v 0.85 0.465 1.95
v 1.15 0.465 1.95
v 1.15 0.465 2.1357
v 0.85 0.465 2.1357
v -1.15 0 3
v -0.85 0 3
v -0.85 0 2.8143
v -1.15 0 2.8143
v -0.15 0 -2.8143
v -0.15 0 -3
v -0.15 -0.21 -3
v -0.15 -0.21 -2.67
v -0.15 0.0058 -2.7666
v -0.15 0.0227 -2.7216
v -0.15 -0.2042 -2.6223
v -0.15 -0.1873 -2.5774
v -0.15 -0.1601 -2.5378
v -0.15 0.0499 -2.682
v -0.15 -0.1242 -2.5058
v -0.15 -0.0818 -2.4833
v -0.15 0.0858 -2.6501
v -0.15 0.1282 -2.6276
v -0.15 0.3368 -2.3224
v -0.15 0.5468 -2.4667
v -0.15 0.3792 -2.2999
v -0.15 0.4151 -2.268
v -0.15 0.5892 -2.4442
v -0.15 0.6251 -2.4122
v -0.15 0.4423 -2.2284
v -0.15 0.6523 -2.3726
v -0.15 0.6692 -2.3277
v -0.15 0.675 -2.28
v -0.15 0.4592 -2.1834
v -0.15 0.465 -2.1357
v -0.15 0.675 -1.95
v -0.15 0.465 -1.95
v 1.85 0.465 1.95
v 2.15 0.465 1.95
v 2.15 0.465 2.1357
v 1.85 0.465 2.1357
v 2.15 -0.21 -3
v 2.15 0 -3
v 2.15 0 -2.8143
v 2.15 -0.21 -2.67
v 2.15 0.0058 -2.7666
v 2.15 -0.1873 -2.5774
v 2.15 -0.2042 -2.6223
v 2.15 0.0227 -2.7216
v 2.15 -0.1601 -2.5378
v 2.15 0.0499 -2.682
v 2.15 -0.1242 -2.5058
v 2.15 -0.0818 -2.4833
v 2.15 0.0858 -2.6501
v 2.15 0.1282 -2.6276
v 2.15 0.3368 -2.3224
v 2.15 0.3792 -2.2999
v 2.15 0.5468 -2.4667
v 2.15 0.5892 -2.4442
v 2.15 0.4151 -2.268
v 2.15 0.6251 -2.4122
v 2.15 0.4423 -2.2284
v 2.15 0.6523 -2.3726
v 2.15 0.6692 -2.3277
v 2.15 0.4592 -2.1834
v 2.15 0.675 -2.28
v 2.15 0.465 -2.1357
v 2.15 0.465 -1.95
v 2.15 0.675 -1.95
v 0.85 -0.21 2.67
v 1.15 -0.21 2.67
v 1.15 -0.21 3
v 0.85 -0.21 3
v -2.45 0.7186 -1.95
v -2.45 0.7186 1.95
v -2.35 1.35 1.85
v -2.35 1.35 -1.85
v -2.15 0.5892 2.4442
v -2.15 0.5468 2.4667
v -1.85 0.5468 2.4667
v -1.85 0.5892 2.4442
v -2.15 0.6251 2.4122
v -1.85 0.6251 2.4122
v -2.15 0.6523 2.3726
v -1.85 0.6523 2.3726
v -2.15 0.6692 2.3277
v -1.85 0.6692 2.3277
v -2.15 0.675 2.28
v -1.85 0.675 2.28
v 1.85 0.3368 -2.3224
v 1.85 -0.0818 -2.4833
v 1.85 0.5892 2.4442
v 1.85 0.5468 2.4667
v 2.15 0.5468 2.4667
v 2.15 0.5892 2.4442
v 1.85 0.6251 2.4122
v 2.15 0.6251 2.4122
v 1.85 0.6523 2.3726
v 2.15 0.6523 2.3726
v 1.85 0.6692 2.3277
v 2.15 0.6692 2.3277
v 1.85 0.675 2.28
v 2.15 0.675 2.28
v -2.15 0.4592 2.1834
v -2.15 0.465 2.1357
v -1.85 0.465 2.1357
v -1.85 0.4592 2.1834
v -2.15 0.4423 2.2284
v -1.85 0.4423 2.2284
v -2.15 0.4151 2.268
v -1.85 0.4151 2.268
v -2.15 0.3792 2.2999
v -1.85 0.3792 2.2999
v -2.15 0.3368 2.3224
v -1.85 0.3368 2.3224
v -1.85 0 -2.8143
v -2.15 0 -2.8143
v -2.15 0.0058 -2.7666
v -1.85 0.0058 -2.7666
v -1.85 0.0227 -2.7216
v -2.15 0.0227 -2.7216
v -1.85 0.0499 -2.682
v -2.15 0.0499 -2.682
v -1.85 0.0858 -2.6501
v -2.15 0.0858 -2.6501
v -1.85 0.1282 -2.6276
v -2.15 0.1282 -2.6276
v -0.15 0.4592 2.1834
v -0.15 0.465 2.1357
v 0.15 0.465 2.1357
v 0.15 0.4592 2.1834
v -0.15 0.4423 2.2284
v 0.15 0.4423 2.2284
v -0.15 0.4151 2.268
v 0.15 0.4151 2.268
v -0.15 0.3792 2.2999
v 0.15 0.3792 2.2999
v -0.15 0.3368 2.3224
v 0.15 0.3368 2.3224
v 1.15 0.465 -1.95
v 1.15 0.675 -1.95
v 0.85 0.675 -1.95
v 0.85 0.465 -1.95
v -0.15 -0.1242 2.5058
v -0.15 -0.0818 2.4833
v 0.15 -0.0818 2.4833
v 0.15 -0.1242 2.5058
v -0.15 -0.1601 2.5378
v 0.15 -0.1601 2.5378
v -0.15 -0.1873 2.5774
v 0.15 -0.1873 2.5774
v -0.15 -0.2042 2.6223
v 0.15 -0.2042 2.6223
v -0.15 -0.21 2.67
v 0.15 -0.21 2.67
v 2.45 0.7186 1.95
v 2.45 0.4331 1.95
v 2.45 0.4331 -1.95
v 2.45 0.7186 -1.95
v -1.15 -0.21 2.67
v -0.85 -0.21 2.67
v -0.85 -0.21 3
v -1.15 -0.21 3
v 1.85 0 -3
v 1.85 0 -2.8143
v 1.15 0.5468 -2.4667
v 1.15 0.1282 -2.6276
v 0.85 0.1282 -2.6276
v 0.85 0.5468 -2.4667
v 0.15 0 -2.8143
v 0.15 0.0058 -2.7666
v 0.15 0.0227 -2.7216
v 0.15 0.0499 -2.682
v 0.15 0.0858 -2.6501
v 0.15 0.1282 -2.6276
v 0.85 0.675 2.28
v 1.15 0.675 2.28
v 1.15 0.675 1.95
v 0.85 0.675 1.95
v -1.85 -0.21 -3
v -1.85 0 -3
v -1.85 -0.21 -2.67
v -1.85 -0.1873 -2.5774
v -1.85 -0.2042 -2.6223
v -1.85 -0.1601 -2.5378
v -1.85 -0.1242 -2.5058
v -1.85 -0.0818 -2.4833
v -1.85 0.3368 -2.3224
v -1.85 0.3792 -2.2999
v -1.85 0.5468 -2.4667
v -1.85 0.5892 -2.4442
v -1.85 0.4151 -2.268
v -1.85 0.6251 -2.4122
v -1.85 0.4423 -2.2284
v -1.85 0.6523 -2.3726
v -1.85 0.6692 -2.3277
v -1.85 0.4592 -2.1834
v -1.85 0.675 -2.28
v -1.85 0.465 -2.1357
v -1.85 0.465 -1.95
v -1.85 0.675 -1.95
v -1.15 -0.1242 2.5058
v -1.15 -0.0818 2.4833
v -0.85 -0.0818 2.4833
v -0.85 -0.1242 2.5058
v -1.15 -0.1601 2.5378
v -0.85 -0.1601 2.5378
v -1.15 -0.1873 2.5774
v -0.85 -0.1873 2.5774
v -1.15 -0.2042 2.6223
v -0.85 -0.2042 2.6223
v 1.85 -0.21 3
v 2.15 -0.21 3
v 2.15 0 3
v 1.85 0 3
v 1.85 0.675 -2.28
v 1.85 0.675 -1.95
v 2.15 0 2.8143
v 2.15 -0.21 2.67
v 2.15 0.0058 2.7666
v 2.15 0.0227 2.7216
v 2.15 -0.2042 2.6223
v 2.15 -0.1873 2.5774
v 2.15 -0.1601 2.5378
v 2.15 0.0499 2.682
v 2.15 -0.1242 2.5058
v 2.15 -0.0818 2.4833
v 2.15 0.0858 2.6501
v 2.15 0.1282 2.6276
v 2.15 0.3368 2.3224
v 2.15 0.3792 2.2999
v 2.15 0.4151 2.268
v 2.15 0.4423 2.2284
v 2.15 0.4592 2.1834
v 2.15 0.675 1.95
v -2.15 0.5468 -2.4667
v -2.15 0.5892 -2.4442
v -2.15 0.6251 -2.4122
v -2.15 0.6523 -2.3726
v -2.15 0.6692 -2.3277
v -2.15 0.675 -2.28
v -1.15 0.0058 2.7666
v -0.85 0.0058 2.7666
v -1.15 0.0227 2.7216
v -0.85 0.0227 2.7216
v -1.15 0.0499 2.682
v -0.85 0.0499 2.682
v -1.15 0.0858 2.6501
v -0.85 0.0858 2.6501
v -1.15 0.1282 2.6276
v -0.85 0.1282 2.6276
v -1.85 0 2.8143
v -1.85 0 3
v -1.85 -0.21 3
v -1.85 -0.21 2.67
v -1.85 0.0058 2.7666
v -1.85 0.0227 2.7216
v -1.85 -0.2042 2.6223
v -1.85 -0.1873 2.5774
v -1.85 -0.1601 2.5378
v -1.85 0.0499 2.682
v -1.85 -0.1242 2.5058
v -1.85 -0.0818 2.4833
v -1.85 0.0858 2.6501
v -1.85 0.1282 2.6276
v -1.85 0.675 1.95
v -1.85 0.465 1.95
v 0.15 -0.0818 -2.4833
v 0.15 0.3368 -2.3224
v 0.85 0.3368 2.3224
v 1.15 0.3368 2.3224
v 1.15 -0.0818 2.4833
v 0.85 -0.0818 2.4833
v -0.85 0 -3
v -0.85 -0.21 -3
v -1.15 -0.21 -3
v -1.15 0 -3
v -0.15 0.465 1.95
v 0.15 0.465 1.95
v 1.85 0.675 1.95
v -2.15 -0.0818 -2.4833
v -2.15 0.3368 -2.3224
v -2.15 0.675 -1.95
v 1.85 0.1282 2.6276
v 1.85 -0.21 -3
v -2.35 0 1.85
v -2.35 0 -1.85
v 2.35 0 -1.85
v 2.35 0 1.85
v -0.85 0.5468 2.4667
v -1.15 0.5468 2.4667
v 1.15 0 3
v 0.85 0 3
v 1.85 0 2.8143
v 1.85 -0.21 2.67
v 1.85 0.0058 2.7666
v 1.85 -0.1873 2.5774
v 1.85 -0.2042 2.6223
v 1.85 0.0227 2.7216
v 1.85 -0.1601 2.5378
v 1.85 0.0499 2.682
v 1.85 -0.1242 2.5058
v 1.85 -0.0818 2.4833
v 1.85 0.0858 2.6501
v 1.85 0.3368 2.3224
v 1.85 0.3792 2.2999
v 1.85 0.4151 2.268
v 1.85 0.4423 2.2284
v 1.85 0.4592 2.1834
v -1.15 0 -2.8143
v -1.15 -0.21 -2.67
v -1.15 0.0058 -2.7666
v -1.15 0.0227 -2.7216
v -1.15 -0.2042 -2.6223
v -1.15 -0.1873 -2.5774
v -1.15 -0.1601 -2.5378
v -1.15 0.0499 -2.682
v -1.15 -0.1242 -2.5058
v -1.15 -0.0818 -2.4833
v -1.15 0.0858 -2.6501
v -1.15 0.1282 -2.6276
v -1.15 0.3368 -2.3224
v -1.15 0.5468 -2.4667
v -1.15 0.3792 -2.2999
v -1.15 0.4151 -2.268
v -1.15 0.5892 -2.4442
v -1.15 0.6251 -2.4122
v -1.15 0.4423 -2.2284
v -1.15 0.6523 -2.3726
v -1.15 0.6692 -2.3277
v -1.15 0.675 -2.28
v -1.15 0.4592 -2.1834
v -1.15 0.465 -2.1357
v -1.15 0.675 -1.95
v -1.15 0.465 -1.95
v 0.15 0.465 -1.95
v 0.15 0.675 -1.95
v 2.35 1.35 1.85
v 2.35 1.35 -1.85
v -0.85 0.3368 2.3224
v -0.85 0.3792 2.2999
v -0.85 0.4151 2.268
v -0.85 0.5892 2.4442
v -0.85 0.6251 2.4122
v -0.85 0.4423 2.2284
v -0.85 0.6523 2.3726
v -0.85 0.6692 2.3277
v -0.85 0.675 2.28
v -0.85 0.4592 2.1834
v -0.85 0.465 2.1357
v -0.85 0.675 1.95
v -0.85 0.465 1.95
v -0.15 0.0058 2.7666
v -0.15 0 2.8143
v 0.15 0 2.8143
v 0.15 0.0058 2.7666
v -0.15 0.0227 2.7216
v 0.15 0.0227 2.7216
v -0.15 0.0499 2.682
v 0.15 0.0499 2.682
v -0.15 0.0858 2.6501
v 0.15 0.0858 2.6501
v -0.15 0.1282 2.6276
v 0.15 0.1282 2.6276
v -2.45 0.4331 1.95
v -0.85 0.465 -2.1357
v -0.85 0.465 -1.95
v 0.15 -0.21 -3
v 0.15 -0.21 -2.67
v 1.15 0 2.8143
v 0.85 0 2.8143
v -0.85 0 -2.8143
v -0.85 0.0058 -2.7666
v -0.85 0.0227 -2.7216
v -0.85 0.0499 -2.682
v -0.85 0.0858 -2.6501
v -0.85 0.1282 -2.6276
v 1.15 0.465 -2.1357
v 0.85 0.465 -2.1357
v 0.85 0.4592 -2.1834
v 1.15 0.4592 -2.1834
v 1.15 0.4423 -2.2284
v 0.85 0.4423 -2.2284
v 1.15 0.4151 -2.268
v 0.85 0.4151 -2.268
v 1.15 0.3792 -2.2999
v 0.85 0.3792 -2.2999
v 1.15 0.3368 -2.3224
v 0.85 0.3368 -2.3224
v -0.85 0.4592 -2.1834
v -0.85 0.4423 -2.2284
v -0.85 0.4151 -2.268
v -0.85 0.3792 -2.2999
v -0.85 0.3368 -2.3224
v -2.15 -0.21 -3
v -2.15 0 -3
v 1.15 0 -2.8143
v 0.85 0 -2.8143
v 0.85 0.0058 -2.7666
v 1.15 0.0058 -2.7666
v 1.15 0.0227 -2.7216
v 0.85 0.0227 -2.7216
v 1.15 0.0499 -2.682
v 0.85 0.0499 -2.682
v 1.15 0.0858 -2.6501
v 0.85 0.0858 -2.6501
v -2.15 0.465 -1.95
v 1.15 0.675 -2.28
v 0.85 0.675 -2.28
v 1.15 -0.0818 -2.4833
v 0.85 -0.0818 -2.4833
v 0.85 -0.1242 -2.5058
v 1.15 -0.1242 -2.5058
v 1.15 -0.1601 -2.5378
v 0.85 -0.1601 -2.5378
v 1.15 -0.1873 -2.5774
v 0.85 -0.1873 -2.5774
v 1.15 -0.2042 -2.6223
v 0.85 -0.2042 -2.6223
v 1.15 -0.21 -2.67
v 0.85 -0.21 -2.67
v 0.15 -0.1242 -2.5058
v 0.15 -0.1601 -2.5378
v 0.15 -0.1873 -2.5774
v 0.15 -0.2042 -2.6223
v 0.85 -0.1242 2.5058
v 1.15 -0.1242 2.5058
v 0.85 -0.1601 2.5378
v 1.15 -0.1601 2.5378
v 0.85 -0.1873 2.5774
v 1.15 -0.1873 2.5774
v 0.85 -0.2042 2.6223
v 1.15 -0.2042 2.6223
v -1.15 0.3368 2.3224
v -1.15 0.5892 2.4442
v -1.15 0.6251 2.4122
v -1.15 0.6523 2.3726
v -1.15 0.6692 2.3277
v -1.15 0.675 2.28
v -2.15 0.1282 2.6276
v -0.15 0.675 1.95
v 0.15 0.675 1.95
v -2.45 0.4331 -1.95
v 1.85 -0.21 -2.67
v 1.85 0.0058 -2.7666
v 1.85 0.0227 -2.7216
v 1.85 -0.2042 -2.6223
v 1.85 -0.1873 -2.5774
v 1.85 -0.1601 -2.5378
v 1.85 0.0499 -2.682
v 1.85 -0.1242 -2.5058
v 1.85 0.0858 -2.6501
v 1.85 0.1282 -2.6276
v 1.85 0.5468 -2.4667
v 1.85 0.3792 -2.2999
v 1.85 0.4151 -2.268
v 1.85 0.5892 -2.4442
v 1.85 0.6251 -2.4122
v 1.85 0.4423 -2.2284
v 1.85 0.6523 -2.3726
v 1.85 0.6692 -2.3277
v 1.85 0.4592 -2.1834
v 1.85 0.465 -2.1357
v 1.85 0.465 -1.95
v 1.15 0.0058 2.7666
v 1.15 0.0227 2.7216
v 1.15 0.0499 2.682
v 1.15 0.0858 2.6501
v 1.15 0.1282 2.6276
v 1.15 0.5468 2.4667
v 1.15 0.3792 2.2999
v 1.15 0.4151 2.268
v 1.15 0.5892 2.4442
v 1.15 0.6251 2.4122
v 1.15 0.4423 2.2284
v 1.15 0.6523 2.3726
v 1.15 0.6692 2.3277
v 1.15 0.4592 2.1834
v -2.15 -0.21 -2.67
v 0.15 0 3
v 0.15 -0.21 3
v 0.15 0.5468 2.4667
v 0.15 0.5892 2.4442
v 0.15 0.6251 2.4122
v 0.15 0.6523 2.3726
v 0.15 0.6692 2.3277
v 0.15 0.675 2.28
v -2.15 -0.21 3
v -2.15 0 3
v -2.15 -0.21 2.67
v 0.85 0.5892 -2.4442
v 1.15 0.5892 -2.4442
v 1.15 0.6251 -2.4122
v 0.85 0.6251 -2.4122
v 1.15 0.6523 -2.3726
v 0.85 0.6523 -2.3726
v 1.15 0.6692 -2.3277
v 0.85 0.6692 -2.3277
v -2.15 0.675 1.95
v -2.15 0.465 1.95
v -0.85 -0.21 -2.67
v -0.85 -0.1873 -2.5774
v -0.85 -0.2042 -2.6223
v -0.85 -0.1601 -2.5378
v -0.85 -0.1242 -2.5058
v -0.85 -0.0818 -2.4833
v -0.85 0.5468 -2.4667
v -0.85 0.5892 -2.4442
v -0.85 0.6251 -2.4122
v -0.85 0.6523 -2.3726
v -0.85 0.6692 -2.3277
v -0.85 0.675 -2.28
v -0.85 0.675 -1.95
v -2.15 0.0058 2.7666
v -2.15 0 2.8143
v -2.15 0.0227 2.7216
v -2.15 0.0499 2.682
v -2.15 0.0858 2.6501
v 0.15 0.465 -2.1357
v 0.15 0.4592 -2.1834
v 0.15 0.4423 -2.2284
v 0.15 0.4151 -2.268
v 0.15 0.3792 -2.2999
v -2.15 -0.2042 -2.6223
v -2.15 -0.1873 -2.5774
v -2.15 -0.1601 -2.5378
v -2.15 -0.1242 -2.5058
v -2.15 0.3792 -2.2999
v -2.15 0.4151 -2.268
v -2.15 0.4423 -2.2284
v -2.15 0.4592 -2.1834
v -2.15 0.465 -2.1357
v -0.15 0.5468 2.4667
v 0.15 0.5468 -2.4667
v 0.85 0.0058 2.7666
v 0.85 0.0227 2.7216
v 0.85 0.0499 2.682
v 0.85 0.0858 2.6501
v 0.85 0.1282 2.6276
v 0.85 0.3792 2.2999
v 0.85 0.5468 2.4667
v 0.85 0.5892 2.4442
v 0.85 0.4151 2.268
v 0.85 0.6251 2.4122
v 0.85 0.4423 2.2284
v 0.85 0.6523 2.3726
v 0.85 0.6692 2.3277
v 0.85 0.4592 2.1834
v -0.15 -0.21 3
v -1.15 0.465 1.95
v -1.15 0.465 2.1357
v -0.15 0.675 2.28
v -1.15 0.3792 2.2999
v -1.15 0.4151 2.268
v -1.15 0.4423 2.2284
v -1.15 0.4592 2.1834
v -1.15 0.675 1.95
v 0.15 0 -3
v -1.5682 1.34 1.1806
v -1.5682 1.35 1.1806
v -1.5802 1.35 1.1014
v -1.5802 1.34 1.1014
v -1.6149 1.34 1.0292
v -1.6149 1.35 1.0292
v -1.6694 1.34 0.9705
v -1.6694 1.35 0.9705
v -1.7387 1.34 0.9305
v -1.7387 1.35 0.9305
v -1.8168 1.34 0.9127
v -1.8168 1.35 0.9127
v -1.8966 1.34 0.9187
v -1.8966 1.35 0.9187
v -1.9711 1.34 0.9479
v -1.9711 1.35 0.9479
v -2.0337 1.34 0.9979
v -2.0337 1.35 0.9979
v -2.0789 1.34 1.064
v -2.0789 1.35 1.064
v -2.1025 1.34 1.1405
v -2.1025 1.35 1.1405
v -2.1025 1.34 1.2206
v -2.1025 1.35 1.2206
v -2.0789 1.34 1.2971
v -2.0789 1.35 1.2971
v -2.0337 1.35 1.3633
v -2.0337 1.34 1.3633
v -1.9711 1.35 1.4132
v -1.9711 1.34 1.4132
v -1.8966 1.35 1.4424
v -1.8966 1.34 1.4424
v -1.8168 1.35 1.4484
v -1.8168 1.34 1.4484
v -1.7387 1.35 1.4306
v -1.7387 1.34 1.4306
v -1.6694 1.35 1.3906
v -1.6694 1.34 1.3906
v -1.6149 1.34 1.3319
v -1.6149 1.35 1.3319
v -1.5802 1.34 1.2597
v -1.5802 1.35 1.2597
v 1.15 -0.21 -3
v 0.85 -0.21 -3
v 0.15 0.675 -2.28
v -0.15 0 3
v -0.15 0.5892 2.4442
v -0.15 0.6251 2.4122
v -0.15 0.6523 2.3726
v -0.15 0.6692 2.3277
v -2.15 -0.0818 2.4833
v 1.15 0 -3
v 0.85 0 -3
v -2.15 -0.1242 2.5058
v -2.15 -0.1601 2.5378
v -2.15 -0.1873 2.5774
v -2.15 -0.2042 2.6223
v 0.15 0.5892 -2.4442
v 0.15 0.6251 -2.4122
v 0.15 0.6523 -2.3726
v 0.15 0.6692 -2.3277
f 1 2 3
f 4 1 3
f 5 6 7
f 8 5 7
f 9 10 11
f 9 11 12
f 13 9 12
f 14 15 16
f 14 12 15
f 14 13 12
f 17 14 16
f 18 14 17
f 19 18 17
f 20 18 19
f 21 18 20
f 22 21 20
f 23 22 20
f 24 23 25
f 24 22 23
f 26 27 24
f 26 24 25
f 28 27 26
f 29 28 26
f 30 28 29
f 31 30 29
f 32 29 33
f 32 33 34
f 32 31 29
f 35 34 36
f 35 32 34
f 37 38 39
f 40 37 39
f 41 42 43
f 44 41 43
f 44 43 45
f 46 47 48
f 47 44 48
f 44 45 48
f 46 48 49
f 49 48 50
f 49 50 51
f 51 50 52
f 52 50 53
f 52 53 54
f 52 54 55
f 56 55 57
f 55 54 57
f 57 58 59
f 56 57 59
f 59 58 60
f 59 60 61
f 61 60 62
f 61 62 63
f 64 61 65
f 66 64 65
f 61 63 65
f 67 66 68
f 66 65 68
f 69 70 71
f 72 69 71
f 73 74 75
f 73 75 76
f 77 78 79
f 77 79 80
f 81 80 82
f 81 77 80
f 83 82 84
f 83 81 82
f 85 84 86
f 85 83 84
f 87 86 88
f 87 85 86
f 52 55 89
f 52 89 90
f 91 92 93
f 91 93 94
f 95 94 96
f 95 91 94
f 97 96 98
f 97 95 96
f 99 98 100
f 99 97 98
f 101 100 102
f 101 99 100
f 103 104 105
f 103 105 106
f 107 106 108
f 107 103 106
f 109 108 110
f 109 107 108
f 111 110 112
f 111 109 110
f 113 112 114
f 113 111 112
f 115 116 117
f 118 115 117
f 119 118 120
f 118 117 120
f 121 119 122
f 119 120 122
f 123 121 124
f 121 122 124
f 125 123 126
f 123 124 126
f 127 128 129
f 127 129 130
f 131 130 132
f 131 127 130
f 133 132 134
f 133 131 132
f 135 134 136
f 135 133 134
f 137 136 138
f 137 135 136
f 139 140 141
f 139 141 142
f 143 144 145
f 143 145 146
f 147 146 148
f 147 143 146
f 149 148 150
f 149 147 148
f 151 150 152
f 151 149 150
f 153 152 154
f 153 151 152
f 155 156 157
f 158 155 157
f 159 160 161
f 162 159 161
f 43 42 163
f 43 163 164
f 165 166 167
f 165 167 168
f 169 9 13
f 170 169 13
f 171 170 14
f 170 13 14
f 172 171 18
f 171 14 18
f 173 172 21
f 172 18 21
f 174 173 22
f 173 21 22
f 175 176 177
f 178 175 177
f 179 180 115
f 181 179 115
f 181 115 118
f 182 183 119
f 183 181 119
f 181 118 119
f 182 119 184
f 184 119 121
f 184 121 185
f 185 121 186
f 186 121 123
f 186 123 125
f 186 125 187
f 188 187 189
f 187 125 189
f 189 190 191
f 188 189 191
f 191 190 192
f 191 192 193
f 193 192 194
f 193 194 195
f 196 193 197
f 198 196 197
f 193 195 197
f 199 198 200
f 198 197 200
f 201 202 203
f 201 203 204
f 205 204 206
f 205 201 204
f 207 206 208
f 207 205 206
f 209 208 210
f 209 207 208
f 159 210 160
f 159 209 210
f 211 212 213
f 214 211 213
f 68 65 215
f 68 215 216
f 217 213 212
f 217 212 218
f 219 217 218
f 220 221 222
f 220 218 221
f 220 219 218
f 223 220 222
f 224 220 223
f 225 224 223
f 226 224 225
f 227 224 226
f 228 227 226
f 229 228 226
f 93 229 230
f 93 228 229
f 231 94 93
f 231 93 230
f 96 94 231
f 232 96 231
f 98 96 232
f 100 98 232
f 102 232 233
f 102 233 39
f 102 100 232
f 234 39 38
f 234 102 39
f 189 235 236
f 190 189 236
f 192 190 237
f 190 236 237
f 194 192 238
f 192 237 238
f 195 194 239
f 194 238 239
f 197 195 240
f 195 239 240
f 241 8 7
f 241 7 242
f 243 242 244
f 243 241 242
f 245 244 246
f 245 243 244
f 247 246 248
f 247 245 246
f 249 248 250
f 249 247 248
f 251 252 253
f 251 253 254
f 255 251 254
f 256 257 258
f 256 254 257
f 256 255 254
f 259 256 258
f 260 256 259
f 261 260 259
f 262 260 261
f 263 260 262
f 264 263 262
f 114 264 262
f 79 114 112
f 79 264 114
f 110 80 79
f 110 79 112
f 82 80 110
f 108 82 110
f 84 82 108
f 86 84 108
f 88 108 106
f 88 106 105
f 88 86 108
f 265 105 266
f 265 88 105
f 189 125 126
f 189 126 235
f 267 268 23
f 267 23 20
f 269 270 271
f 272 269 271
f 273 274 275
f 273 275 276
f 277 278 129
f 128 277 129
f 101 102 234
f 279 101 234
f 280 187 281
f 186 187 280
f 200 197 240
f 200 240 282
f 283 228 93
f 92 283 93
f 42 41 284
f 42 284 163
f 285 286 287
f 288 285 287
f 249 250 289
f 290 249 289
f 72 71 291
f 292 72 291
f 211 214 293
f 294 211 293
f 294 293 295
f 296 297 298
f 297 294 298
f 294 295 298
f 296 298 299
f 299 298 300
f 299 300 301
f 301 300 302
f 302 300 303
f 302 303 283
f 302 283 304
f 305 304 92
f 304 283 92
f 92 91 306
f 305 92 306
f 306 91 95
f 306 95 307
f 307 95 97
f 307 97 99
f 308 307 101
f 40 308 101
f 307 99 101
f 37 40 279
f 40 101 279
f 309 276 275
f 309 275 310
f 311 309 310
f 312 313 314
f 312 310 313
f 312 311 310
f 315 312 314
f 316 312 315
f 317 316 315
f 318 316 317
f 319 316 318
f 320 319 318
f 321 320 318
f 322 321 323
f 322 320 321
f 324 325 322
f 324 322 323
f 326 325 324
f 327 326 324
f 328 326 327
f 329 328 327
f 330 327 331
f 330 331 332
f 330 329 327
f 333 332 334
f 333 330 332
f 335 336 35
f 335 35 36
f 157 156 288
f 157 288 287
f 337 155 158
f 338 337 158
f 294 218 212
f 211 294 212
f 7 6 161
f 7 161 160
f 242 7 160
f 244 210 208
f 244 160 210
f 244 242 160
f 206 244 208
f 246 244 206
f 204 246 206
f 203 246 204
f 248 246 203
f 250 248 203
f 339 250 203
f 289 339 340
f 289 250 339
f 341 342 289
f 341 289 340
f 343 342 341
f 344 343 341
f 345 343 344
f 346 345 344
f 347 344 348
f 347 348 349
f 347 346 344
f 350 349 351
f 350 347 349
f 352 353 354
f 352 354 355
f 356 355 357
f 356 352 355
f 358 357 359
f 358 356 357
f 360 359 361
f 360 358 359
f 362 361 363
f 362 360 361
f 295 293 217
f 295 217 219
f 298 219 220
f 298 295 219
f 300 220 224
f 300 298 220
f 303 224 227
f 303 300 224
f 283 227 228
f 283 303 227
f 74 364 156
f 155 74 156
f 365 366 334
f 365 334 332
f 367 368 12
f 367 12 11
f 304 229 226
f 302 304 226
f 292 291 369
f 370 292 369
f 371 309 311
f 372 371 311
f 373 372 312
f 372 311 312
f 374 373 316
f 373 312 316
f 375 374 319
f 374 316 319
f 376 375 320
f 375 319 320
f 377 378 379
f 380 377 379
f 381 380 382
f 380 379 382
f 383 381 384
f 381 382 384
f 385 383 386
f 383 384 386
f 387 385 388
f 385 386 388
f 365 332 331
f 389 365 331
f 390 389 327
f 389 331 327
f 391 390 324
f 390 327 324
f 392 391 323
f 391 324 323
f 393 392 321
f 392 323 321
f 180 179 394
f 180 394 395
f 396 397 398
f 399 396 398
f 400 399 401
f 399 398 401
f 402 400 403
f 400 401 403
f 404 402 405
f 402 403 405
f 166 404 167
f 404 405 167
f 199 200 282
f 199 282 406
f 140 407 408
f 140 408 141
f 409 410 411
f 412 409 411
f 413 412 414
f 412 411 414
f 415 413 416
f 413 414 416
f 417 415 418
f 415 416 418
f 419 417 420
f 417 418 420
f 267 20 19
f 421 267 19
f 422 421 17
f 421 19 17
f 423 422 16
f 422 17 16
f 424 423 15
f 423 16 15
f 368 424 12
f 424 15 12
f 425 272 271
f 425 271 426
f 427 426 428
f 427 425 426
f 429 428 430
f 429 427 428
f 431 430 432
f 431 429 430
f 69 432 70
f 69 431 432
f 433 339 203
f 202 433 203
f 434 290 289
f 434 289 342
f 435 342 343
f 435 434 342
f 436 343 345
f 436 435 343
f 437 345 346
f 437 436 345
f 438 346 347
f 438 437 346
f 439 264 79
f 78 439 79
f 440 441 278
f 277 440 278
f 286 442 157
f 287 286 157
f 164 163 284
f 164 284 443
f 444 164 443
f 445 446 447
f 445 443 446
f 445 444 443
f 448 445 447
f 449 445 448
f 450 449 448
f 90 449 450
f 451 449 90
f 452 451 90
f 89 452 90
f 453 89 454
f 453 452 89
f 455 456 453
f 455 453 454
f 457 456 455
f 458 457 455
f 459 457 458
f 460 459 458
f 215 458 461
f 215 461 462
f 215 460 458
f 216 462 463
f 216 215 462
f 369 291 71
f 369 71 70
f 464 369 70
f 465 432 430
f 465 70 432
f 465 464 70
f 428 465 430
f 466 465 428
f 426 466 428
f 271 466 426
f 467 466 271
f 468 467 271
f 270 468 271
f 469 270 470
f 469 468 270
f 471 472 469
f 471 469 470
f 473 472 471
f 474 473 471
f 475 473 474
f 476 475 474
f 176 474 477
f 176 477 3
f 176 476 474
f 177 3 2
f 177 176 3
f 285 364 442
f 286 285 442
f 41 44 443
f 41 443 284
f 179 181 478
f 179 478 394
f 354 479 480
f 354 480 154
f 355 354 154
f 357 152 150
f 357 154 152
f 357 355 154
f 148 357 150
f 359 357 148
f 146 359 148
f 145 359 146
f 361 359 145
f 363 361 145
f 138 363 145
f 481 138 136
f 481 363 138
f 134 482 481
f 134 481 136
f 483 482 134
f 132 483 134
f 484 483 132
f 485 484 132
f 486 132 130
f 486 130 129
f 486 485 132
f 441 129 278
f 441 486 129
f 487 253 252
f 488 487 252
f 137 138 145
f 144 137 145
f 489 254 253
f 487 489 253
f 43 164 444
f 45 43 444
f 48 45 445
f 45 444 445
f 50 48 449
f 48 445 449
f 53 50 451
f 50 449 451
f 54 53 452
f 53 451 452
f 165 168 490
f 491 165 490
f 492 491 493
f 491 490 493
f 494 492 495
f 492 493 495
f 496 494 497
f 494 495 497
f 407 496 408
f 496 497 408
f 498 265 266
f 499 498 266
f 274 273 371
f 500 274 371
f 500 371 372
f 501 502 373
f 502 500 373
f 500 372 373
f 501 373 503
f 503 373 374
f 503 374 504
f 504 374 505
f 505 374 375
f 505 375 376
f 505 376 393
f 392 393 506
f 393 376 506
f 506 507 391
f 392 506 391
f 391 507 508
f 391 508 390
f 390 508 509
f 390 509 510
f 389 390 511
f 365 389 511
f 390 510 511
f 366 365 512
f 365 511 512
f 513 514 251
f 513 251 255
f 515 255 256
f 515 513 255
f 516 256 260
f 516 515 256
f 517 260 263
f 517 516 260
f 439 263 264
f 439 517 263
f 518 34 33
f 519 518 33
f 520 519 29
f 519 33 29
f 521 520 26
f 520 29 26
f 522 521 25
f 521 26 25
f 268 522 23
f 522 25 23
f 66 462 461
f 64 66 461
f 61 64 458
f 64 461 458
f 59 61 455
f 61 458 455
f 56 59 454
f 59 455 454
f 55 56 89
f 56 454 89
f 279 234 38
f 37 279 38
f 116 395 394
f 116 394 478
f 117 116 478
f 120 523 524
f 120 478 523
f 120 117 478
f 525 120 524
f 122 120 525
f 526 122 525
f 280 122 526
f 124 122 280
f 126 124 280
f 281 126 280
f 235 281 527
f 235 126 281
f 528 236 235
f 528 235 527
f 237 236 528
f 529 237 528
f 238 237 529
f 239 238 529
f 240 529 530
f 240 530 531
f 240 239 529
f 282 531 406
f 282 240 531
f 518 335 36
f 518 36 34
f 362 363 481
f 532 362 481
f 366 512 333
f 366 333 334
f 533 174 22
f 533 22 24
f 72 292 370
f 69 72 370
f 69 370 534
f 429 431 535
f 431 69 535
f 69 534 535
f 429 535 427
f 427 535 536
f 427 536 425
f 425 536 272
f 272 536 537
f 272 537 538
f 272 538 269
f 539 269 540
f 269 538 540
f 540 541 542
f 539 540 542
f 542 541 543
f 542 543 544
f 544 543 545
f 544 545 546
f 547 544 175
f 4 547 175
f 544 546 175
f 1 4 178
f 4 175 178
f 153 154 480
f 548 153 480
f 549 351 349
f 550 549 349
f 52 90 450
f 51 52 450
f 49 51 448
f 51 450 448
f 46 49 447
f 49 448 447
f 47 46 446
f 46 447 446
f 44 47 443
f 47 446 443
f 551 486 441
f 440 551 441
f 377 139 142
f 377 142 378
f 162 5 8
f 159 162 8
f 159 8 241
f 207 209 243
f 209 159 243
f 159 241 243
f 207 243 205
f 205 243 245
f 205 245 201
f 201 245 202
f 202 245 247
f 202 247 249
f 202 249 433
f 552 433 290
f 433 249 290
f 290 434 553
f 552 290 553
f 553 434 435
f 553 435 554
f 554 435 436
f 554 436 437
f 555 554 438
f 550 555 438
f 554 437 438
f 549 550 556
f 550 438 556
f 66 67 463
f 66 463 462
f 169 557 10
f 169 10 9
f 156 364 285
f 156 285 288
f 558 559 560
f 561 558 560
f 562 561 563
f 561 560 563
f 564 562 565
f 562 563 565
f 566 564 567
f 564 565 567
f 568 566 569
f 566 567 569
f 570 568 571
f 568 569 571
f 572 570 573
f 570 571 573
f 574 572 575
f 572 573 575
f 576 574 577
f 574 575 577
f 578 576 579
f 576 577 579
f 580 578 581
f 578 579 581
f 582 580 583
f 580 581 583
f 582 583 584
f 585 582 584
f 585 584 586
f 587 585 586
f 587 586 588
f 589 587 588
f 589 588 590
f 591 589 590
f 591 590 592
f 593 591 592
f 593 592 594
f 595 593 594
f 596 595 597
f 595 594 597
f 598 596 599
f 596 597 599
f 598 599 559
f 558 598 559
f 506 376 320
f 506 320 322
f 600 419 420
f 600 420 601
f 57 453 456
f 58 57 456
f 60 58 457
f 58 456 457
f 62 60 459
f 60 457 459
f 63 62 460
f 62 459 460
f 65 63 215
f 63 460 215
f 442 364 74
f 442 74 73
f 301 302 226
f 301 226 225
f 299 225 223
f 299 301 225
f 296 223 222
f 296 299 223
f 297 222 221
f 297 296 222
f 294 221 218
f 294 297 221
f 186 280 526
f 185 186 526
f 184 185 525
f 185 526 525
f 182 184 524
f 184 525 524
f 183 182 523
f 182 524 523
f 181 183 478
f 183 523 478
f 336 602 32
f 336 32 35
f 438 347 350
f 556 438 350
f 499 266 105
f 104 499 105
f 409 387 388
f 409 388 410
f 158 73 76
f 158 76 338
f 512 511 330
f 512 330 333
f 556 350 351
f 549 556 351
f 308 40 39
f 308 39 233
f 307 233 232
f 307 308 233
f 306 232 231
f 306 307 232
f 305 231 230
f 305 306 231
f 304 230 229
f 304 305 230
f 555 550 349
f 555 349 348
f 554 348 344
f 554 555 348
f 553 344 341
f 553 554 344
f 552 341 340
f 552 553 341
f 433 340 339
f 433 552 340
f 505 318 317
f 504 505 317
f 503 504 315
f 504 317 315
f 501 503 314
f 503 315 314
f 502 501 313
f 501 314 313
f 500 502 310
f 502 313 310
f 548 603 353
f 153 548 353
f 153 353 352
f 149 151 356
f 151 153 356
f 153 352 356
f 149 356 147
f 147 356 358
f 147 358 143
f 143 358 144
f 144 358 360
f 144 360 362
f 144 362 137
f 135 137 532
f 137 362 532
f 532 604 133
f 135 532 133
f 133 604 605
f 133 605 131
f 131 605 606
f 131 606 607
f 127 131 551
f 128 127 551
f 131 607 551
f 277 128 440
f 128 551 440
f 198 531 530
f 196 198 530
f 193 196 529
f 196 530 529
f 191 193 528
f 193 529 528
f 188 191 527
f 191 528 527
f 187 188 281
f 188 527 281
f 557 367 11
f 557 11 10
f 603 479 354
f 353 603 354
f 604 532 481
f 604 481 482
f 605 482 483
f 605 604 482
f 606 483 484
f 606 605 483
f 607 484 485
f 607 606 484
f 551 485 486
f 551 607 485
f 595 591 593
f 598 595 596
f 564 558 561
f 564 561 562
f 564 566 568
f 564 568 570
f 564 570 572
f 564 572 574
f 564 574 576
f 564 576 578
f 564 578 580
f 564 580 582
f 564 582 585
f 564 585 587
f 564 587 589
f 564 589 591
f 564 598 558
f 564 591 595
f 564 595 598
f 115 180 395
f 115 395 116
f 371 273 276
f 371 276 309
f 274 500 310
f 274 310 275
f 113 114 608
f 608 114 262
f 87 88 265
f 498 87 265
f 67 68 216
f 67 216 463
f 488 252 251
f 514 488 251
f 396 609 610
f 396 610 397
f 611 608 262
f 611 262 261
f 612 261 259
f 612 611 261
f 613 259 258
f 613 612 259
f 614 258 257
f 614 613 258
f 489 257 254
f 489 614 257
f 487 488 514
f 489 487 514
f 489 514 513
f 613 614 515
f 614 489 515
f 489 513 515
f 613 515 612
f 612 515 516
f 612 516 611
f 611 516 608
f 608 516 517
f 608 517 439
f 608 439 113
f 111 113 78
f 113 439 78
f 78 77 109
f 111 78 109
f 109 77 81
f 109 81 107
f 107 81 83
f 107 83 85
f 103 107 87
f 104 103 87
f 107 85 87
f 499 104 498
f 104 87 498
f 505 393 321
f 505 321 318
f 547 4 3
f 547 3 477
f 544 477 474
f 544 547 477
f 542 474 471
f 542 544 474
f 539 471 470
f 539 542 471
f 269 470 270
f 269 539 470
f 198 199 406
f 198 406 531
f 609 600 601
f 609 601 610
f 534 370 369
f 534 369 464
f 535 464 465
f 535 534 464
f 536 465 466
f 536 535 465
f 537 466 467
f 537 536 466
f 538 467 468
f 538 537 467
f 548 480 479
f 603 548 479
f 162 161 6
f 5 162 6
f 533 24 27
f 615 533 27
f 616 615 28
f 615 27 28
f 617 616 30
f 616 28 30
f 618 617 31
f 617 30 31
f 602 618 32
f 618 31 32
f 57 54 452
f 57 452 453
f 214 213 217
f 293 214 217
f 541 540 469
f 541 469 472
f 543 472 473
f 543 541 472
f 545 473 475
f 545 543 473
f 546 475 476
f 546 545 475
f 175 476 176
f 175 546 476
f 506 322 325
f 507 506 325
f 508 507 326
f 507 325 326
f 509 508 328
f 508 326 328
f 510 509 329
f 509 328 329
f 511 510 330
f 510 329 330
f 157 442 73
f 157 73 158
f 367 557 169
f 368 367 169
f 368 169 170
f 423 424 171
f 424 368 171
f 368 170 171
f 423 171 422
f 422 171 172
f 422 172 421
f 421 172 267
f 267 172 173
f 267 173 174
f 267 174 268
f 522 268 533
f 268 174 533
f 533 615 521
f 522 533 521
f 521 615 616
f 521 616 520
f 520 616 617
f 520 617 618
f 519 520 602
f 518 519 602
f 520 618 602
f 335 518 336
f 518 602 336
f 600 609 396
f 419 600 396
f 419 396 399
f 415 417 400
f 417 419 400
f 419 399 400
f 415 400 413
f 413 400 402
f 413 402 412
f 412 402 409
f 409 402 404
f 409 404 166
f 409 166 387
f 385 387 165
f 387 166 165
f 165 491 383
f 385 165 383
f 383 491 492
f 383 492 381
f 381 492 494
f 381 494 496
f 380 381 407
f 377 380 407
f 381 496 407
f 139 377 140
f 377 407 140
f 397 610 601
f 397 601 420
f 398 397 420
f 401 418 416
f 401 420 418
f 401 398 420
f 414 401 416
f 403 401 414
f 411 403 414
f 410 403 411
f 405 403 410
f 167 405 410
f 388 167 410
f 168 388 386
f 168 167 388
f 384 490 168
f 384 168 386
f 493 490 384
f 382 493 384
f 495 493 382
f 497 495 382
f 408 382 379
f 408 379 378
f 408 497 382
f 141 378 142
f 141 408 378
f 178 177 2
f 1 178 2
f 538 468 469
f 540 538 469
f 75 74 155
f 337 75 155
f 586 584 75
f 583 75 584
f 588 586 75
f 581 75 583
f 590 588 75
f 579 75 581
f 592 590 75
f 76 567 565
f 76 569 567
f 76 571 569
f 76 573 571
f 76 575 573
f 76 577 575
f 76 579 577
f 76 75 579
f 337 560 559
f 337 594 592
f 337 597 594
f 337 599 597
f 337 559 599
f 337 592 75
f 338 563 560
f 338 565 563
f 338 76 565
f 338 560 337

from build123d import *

# Parameters (mm, degrees)
SKETCH1_W           = 4.9
SKETCH1_H           = 3.9
BOSS_EXTRUDE1_DEPTH = 1.35
BOSS_EXTRUDE2_DEPTH = 4.9
FILLET1_R           = 0.2
SKETCH3_OUTSIDE_W   = 8.328
SKETCH3_OUTSIDE_H   = 8.378
SKETCH3_OUTSIDE_W_2 = 0.3
SKETCH3_OUTSIDE_H_2 = 1.05
CUT_EXTRUDE1_DEPTH  = 2.56
CHAMFER1_SIZE       = 0.1
CHAMFER1_SIZE2      = 0.433147587
CHAMFER2_SIZE       = 0.1
CHAMFER2_SIZE2      = 0.631375151
SKETCH4_R           = 0.268615899
CUT_EXTRUDE2_DEPTH  = 0.01


with BuildPart() as part:
    # Sketch1 → Boss-Extrude1 (new body)
    with BuildSketch(Plane(origin=(0, 0, 0), x_dir=(1, 0, 0), z_dir=(0, 1, 0))):
        Rectangle(SKETCH1_W, SKETCH1_H)
    extrude(amount=BOSS_EXTRUDE1_DEPTH)

    # Chamfer1
    chamfer1_edges = [part.edges().sort_by_distance(p)[0] for p in [
        (0, 0, -1.95),
        (2.45, 0, 0),
        (0, 0, 1.95),
        (-2.45, 0, 0),
    ]]
    chamfer1_side = [part.faces().sort_by_distance(p)[0] for p in [
        (0, 0, 0),
    ]]
    chamfer(chamfer1_edges, length=CHAMFER1_SIZE, length2=CHAMFER1_SIZE2, reference=chamfer1_side[0])

    # Chamfer2
    chamfer2_edges = [part.edges().sort_by_distance(p)[0] for p in [
        (2.45, 1.35, 0),
        (0, 1.35, -1.95),
        (-2.45, 1.35, 0),
        (0, 1.35, 1.95),
    ]]
    chamfer2_side = [part.faces().sort_by_distance(p)[0] for p in [
        (0, 1.35, 0),
    ]]
    chamfer(chamfer2_edges, length=CHAMFER2_SIZE, length2=CHAMFER2_SIZE2, reference=chamfer2_side[0])

    # Sketch4 → Cut-Extrude2 (cut)
    with BuildSketch(Plane(origin=(0, 1.35, 0), x_dir=(1, 0, 0), z_dir=(0, 1, 0))):
        with Locations((-1.836838836, -1.180555556)):
            Circle(SKETCH4_R)
    extrude(amount=-CUT_EXTRUDE2_DEPTH, mode=Mode.SUBTRACT)


with BuildPart() as body_2:
    # Sketch2 → Boss-Extrude2 (new body)
    with BuildSketch(Plane(origin=(2.45, 0, 0), x_dir=(0, 0, -1), z_dir=(1, 0, 0))):
        Polygon((-1.95, 0.465), (-2.273129751, 0.465), (-2.532616852, -0.21), (-3, -0.21), (-3, 0), (-2.676870249, 0), (-2.417383148, 0.675), (-1.95, 0.675), align=None)
    extrude(amount=-BOSS_EXTRUDE2_DEPTH)

    # Fillet1
    fillet1_edges = [body_2.edges().sort_by_distance(p)[0] for p in [
        (0, 0.465, 2.273129751),
        (0, -0.21, 2.532616852),
        (0, 0, 2.676870249),
        (0, 0.675, 2.417383148),
    ]]
    fillet(fillet1_edges, radius=FILLET1_R)

    # Sketch3 outside → Cut-Extrude1 (cut, through all)
    with BuildSketch(Plane(origin=(0, 1.35, 0), x_dir=(1, 0, 0), z_dir=(0, 1, 0))):
        with Locations((0, -0.525)):
            Rectangle(SKETCH3_OUTSIDE_W, SKETCH3_OUTSIDE_H)
        with Locations((0, -2.475)):
            Rectangle(SKETCH3_OUTSIDE_W_2, SKETCH3_OUTSIDE_H_2, mode=Mode.SUBTRACT)
        with Locations((1, -2.475)):
            Rectangle(SKETCH3_OUTSIDE_W_2, SKETCH3_OUTSIDE_H_2, mode=Mode.SUBTRACT)
        with Locations((2, -2.475)):
            Rectangle(SKETCH3_OUTSIDE_W_2, SKETCH3_OUTSIDE_H_2, mode=Mode.SUBTRACT)
        with Locations((-1, -2.475)):
            Rectangle(SKETCH3_OUTSIDE_W_2, SKETCH3_OUTSIDE_H_2, mode=Mode.SUBTRACT)
        with Locations((-2, -2.475)):
            Rectangle(SKETCH3_OUTSIDE_W_2, SKETCH3_OUTSIDE_H_2, mode=Mode.SUBTRACT)
    extrude(amount=-CUT_EXTRUDE1_DEPTH, mode=Mode.SUBTRACT)


with BuildPart() as body_3:
    # Mirror2: mirrored copy
    add(body_2.part.mirror(Plane.XY))


solid = Compound([part.part, body_2.part, body_3.part])
